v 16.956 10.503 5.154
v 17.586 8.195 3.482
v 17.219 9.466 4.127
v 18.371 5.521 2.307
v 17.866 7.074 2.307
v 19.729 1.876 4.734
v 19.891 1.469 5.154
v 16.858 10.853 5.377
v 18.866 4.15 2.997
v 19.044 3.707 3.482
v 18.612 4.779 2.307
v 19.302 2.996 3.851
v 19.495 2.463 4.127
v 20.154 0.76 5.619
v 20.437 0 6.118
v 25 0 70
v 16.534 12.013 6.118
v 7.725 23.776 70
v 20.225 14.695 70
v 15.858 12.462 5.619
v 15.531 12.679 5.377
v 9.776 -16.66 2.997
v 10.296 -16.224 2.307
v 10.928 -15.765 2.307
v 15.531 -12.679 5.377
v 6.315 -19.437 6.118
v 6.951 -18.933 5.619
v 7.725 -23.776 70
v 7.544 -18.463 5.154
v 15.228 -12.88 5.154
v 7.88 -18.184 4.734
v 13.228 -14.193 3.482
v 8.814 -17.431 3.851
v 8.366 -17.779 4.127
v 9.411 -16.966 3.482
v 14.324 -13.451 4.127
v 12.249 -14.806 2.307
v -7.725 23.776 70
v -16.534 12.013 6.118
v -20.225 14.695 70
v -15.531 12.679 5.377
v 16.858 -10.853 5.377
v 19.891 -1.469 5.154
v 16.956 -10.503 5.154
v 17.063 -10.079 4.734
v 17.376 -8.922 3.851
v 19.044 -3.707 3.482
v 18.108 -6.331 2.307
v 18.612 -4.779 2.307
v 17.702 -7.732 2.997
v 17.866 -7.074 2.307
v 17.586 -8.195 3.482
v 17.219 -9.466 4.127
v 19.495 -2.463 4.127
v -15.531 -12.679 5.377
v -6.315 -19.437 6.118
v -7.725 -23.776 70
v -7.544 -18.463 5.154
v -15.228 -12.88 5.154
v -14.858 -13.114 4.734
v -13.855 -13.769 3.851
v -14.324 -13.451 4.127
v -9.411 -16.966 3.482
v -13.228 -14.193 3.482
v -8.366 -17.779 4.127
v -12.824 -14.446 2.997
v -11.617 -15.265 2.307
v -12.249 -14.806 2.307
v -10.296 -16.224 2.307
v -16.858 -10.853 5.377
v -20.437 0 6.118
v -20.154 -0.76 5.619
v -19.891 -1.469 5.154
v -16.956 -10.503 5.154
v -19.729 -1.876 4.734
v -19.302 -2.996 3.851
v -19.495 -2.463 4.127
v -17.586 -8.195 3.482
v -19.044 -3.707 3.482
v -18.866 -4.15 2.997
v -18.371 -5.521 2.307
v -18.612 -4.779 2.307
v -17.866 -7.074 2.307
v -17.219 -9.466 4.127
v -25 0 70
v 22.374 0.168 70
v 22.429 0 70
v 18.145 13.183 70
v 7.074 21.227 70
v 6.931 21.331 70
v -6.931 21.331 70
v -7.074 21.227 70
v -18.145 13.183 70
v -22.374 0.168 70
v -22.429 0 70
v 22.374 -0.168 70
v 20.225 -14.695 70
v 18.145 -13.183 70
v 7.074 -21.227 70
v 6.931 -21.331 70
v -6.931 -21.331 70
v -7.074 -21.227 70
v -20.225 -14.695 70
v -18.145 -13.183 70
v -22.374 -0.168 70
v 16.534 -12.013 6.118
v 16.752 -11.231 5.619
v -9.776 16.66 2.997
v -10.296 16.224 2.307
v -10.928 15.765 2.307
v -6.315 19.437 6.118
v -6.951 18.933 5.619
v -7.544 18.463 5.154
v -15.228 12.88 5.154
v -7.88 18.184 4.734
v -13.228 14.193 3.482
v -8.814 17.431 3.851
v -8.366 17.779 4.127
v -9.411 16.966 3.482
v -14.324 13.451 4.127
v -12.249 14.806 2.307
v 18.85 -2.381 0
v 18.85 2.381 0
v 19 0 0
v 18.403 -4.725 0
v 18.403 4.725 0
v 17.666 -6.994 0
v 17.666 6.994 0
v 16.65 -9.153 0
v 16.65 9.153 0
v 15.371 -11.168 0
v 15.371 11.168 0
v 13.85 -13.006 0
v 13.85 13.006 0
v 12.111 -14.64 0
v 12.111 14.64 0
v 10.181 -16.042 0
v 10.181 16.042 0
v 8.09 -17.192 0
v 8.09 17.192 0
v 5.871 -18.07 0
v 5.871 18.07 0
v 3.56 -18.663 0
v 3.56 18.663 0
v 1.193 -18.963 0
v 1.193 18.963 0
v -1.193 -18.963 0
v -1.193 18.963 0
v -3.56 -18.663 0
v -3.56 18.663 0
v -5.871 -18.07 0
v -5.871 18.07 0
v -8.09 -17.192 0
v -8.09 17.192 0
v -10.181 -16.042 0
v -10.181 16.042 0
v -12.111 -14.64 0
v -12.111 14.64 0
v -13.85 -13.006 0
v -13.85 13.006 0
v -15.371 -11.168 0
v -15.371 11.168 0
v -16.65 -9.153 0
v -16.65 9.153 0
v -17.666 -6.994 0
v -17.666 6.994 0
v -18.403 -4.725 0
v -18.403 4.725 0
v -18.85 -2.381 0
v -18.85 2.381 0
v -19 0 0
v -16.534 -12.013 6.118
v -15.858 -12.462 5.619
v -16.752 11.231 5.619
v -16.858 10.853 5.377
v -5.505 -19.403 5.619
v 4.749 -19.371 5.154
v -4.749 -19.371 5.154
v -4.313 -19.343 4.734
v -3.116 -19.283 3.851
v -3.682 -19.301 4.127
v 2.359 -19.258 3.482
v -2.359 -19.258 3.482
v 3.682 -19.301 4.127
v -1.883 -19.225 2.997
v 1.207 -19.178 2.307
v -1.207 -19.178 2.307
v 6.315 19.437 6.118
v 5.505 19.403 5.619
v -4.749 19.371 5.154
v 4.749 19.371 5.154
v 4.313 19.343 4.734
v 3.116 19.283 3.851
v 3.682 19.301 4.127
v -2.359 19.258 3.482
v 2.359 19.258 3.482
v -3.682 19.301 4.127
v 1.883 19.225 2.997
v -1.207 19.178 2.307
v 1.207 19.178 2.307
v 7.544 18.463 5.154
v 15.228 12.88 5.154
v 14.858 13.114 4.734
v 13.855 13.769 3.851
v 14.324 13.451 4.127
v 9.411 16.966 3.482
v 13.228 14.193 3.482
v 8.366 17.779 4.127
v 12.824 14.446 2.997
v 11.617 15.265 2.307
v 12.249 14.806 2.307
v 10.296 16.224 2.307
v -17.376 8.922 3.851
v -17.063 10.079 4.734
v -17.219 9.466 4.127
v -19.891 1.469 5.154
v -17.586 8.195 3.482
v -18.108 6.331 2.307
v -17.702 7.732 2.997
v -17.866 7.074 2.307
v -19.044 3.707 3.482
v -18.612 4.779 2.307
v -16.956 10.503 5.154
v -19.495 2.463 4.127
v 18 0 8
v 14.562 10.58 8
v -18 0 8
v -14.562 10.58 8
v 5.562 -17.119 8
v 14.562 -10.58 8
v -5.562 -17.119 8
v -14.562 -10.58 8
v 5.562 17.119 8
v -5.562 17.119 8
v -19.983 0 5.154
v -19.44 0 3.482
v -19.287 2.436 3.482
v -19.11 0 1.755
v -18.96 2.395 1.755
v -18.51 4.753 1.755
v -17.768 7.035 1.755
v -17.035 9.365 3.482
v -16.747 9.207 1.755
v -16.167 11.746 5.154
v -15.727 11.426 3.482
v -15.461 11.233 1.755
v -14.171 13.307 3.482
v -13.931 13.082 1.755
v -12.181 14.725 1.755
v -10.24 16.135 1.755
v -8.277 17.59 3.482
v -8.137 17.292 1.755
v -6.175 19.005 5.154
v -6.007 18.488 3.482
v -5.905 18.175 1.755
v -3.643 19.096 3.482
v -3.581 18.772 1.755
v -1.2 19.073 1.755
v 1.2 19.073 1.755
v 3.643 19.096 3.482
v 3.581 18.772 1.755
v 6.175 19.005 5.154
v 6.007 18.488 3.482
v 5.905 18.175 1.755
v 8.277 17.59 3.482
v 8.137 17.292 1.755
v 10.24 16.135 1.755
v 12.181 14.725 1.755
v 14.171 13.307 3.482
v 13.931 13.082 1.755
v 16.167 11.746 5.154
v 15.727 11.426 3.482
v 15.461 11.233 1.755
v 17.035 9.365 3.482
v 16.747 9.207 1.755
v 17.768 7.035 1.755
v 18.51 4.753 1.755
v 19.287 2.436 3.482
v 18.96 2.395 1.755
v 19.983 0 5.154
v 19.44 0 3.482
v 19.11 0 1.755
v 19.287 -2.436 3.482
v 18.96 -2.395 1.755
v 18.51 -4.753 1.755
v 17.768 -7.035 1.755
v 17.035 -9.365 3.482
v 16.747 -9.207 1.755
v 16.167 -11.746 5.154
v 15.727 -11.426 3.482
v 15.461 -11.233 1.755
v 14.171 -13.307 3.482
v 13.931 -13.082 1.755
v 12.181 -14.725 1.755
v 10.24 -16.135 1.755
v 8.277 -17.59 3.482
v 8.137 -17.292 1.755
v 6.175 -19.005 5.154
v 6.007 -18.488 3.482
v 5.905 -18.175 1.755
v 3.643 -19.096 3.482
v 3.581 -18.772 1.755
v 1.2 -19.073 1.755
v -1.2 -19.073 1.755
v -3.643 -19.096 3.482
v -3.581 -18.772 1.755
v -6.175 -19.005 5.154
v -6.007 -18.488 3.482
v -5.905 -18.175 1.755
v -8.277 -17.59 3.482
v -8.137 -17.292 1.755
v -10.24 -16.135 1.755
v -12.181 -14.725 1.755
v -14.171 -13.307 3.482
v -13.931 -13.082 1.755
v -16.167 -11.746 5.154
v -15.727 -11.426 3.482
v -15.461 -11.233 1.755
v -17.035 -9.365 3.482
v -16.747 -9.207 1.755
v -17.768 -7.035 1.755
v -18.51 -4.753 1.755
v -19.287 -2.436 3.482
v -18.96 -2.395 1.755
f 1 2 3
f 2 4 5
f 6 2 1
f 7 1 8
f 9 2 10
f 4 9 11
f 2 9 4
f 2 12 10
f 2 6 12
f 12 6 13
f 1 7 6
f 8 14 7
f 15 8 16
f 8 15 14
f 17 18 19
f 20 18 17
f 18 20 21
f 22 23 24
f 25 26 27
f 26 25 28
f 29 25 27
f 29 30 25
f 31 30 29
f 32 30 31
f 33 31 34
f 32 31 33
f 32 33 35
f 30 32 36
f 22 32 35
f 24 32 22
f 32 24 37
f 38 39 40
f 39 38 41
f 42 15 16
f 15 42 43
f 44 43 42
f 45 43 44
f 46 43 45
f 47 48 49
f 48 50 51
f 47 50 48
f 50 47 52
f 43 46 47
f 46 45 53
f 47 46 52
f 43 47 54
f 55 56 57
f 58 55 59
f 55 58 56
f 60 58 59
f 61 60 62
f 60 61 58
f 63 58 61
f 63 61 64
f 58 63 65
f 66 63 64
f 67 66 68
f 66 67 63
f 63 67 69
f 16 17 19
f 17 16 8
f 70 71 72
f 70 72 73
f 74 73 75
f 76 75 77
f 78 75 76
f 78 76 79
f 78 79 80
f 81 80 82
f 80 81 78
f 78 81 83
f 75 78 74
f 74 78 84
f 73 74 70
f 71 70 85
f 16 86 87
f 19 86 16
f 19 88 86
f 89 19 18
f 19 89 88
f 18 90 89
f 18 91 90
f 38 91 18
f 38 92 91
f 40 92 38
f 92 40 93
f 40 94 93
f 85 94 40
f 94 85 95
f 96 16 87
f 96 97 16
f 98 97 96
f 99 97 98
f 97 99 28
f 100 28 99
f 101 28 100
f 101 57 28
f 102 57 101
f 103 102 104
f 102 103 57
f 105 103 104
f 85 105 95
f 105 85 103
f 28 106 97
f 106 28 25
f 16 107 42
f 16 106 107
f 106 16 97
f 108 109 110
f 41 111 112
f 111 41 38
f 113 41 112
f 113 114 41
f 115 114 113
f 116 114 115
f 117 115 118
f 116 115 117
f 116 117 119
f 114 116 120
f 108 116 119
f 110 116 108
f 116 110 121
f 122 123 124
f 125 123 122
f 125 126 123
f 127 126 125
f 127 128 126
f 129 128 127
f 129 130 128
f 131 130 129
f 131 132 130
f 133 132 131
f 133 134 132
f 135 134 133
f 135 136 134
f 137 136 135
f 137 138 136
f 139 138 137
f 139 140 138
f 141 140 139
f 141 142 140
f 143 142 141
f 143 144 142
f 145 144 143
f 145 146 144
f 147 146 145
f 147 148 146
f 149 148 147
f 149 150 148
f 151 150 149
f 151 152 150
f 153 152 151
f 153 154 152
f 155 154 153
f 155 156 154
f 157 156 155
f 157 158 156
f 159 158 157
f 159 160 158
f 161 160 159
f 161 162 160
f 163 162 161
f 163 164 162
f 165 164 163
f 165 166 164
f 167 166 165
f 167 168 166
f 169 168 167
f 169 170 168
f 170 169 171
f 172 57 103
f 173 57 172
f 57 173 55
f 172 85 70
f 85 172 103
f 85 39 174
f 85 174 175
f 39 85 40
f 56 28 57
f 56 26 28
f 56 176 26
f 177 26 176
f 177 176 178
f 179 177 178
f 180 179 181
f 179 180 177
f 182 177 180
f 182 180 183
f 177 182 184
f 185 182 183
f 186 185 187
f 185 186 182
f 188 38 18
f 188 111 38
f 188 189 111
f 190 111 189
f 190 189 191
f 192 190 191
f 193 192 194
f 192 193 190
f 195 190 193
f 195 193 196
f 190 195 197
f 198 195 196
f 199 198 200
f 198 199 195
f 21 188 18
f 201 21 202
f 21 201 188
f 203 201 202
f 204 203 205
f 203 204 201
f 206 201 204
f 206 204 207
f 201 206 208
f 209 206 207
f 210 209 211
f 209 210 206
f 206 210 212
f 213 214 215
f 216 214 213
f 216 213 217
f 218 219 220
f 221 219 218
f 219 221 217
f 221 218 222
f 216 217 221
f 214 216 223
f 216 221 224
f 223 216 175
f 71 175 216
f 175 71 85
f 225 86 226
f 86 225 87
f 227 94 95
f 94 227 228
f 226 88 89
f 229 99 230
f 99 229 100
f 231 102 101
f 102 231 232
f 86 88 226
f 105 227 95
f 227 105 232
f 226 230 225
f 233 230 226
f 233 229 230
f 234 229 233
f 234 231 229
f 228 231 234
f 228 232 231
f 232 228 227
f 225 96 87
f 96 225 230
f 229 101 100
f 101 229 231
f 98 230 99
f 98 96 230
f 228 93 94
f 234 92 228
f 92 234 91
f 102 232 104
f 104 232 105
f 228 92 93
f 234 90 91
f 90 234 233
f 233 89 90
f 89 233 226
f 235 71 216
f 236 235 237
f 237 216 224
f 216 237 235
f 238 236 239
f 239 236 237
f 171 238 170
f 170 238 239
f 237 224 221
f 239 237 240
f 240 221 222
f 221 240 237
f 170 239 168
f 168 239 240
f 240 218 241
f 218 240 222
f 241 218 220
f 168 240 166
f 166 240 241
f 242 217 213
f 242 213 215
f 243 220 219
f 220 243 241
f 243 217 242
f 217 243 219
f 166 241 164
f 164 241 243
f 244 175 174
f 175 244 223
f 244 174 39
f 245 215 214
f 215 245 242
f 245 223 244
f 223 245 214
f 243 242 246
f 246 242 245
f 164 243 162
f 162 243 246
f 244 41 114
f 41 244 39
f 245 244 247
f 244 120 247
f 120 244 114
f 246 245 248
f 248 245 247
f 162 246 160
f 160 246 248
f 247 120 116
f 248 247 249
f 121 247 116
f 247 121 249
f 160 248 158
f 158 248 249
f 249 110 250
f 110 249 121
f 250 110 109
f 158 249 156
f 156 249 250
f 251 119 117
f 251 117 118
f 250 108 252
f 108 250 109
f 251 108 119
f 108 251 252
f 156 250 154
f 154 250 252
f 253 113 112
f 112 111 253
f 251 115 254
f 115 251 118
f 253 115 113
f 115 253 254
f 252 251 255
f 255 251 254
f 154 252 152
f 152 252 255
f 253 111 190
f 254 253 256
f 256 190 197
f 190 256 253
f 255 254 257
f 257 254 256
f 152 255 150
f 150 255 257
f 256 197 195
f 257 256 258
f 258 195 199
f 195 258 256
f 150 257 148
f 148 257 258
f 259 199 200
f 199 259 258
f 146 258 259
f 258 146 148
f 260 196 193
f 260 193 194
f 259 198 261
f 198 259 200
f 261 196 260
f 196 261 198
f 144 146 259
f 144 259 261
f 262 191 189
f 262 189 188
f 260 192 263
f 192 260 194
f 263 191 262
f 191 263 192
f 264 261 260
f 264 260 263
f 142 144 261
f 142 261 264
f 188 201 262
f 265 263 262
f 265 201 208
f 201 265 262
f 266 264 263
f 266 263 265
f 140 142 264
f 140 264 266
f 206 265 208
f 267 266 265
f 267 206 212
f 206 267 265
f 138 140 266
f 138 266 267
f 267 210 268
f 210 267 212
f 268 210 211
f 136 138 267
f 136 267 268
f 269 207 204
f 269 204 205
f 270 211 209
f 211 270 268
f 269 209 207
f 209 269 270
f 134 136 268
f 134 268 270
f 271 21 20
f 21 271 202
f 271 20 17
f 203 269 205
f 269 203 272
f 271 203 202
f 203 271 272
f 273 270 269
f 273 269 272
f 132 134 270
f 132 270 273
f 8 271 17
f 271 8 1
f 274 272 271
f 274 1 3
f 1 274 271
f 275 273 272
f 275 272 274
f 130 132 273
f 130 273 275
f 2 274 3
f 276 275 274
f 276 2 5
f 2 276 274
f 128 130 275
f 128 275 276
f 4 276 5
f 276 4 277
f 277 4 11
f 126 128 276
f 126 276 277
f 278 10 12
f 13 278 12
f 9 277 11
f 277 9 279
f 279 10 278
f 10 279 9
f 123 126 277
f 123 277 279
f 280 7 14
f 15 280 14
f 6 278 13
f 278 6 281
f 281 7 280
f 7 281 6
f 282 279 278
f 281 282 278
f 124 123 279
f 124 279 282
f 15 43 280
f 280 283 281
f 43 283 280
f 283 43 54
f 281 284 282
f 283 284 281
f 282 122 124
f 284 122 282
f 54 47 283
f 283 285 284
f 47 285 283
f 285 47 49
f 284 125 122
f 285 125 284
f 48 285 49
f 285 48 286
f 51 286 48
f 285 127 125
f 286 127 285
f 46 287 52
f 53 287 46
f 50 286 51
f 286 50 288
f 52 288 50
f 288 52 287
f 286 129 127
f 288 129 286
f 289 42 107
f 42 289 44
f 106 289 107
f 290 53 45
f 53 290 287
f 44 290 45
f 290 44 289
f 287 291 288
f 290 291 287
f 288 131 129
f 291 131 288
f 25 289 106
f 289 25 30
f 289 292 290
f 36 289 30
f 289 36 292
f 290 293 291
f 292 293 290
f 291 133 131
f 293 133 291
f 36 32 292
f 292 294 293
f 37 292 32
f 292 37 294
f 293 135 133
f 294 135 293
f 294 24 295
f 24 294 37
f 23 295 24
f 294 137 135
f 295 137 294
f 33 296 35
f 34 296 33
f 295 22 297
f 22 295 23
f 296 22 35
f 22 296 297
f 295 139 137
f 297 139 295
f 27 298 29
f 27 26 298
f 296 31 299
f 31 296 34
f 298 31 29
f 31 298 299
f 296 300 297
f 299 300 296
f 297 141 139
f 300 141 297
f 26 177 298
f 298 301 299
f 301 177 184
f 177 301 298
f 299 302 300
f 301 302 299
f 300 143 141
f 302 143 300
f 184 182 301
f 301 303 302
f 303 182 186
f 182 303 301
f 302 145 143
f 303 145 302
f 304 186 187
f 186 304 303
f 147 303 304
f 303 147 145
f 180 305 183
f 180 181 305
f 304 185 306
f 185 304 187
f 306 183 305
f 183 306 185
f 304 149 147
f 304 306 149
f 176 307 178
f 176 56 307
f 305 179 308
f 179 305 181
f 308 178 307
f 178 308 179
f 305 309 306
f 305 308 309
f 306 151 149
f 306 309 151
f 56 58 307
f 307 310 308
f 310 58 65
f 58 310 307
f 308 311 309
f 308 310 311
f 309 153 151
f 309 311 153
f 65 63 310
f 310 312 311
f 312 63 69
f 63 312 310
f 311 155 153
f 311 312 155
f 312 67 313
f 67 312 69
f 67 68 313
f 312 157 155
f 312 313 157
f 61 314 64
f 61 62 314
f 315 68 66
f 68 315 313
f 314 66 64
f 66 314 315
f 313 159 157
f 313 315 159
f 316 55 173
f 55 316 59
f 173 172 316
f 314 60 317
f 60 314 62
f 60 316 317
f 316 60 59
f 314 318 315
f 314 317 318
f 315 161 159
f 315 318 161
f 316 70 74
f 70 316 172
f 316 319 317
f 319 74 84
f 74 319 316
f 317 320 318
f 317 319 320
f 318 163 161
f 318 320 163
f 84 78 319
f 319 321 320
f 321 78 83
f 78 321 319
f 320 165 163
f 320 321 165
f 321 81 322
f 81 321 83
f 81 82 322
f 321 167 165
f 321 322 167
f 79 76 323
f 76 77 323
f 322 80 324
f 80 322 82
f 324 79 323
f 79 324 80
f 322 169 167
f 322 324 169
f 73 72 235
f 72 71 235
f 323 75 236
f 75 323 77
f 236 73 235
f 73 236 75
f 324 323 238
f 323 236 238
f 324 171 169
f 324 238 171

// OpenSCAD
/*****************************************
 Aliaksei Petsiuk
 EE5777 Open Source 3D Printing
 Customizable Pen Holder
*****************************************/
number_of_faces = 10;


cylinder_height = 70;
cylinder_top_diameter = 50;
cylinder_bottom_diameter = 40;

pen_chamber_depth = 0.9*cylinder_height;
pen_chamber_top_diameter = 0.9*cylinder_top_diameter;
pen_chamber_bottom_diameter = 0.9*cylinder_bottom_diameter;

bottop_feature_1 = cylinder_height/2-2;
bottom_feature_2 = cylinder_height/5;

$fn=number_of_faces;

difference() {
cylinder(h=cylinder_height, r1=cylinder_bottom_diameter/2, r2=cylinder_top_diameter/2, center = false);

translate([0, 0, cylinder_height-pen_chamber_depth+1])
cylinder(h=pen_chamber_depth, r1=pen_chamber_bottom_diameter/2, r2=pen_chamber_top_diameter/2, center = false);
    
//Create Torus for subtraction
  rotate_extrude(convexity = number_of_faces, $fn=50)
  translate([bottop_feature_1, 0, 0])
  circle(r = bottom_feature_2);
}
